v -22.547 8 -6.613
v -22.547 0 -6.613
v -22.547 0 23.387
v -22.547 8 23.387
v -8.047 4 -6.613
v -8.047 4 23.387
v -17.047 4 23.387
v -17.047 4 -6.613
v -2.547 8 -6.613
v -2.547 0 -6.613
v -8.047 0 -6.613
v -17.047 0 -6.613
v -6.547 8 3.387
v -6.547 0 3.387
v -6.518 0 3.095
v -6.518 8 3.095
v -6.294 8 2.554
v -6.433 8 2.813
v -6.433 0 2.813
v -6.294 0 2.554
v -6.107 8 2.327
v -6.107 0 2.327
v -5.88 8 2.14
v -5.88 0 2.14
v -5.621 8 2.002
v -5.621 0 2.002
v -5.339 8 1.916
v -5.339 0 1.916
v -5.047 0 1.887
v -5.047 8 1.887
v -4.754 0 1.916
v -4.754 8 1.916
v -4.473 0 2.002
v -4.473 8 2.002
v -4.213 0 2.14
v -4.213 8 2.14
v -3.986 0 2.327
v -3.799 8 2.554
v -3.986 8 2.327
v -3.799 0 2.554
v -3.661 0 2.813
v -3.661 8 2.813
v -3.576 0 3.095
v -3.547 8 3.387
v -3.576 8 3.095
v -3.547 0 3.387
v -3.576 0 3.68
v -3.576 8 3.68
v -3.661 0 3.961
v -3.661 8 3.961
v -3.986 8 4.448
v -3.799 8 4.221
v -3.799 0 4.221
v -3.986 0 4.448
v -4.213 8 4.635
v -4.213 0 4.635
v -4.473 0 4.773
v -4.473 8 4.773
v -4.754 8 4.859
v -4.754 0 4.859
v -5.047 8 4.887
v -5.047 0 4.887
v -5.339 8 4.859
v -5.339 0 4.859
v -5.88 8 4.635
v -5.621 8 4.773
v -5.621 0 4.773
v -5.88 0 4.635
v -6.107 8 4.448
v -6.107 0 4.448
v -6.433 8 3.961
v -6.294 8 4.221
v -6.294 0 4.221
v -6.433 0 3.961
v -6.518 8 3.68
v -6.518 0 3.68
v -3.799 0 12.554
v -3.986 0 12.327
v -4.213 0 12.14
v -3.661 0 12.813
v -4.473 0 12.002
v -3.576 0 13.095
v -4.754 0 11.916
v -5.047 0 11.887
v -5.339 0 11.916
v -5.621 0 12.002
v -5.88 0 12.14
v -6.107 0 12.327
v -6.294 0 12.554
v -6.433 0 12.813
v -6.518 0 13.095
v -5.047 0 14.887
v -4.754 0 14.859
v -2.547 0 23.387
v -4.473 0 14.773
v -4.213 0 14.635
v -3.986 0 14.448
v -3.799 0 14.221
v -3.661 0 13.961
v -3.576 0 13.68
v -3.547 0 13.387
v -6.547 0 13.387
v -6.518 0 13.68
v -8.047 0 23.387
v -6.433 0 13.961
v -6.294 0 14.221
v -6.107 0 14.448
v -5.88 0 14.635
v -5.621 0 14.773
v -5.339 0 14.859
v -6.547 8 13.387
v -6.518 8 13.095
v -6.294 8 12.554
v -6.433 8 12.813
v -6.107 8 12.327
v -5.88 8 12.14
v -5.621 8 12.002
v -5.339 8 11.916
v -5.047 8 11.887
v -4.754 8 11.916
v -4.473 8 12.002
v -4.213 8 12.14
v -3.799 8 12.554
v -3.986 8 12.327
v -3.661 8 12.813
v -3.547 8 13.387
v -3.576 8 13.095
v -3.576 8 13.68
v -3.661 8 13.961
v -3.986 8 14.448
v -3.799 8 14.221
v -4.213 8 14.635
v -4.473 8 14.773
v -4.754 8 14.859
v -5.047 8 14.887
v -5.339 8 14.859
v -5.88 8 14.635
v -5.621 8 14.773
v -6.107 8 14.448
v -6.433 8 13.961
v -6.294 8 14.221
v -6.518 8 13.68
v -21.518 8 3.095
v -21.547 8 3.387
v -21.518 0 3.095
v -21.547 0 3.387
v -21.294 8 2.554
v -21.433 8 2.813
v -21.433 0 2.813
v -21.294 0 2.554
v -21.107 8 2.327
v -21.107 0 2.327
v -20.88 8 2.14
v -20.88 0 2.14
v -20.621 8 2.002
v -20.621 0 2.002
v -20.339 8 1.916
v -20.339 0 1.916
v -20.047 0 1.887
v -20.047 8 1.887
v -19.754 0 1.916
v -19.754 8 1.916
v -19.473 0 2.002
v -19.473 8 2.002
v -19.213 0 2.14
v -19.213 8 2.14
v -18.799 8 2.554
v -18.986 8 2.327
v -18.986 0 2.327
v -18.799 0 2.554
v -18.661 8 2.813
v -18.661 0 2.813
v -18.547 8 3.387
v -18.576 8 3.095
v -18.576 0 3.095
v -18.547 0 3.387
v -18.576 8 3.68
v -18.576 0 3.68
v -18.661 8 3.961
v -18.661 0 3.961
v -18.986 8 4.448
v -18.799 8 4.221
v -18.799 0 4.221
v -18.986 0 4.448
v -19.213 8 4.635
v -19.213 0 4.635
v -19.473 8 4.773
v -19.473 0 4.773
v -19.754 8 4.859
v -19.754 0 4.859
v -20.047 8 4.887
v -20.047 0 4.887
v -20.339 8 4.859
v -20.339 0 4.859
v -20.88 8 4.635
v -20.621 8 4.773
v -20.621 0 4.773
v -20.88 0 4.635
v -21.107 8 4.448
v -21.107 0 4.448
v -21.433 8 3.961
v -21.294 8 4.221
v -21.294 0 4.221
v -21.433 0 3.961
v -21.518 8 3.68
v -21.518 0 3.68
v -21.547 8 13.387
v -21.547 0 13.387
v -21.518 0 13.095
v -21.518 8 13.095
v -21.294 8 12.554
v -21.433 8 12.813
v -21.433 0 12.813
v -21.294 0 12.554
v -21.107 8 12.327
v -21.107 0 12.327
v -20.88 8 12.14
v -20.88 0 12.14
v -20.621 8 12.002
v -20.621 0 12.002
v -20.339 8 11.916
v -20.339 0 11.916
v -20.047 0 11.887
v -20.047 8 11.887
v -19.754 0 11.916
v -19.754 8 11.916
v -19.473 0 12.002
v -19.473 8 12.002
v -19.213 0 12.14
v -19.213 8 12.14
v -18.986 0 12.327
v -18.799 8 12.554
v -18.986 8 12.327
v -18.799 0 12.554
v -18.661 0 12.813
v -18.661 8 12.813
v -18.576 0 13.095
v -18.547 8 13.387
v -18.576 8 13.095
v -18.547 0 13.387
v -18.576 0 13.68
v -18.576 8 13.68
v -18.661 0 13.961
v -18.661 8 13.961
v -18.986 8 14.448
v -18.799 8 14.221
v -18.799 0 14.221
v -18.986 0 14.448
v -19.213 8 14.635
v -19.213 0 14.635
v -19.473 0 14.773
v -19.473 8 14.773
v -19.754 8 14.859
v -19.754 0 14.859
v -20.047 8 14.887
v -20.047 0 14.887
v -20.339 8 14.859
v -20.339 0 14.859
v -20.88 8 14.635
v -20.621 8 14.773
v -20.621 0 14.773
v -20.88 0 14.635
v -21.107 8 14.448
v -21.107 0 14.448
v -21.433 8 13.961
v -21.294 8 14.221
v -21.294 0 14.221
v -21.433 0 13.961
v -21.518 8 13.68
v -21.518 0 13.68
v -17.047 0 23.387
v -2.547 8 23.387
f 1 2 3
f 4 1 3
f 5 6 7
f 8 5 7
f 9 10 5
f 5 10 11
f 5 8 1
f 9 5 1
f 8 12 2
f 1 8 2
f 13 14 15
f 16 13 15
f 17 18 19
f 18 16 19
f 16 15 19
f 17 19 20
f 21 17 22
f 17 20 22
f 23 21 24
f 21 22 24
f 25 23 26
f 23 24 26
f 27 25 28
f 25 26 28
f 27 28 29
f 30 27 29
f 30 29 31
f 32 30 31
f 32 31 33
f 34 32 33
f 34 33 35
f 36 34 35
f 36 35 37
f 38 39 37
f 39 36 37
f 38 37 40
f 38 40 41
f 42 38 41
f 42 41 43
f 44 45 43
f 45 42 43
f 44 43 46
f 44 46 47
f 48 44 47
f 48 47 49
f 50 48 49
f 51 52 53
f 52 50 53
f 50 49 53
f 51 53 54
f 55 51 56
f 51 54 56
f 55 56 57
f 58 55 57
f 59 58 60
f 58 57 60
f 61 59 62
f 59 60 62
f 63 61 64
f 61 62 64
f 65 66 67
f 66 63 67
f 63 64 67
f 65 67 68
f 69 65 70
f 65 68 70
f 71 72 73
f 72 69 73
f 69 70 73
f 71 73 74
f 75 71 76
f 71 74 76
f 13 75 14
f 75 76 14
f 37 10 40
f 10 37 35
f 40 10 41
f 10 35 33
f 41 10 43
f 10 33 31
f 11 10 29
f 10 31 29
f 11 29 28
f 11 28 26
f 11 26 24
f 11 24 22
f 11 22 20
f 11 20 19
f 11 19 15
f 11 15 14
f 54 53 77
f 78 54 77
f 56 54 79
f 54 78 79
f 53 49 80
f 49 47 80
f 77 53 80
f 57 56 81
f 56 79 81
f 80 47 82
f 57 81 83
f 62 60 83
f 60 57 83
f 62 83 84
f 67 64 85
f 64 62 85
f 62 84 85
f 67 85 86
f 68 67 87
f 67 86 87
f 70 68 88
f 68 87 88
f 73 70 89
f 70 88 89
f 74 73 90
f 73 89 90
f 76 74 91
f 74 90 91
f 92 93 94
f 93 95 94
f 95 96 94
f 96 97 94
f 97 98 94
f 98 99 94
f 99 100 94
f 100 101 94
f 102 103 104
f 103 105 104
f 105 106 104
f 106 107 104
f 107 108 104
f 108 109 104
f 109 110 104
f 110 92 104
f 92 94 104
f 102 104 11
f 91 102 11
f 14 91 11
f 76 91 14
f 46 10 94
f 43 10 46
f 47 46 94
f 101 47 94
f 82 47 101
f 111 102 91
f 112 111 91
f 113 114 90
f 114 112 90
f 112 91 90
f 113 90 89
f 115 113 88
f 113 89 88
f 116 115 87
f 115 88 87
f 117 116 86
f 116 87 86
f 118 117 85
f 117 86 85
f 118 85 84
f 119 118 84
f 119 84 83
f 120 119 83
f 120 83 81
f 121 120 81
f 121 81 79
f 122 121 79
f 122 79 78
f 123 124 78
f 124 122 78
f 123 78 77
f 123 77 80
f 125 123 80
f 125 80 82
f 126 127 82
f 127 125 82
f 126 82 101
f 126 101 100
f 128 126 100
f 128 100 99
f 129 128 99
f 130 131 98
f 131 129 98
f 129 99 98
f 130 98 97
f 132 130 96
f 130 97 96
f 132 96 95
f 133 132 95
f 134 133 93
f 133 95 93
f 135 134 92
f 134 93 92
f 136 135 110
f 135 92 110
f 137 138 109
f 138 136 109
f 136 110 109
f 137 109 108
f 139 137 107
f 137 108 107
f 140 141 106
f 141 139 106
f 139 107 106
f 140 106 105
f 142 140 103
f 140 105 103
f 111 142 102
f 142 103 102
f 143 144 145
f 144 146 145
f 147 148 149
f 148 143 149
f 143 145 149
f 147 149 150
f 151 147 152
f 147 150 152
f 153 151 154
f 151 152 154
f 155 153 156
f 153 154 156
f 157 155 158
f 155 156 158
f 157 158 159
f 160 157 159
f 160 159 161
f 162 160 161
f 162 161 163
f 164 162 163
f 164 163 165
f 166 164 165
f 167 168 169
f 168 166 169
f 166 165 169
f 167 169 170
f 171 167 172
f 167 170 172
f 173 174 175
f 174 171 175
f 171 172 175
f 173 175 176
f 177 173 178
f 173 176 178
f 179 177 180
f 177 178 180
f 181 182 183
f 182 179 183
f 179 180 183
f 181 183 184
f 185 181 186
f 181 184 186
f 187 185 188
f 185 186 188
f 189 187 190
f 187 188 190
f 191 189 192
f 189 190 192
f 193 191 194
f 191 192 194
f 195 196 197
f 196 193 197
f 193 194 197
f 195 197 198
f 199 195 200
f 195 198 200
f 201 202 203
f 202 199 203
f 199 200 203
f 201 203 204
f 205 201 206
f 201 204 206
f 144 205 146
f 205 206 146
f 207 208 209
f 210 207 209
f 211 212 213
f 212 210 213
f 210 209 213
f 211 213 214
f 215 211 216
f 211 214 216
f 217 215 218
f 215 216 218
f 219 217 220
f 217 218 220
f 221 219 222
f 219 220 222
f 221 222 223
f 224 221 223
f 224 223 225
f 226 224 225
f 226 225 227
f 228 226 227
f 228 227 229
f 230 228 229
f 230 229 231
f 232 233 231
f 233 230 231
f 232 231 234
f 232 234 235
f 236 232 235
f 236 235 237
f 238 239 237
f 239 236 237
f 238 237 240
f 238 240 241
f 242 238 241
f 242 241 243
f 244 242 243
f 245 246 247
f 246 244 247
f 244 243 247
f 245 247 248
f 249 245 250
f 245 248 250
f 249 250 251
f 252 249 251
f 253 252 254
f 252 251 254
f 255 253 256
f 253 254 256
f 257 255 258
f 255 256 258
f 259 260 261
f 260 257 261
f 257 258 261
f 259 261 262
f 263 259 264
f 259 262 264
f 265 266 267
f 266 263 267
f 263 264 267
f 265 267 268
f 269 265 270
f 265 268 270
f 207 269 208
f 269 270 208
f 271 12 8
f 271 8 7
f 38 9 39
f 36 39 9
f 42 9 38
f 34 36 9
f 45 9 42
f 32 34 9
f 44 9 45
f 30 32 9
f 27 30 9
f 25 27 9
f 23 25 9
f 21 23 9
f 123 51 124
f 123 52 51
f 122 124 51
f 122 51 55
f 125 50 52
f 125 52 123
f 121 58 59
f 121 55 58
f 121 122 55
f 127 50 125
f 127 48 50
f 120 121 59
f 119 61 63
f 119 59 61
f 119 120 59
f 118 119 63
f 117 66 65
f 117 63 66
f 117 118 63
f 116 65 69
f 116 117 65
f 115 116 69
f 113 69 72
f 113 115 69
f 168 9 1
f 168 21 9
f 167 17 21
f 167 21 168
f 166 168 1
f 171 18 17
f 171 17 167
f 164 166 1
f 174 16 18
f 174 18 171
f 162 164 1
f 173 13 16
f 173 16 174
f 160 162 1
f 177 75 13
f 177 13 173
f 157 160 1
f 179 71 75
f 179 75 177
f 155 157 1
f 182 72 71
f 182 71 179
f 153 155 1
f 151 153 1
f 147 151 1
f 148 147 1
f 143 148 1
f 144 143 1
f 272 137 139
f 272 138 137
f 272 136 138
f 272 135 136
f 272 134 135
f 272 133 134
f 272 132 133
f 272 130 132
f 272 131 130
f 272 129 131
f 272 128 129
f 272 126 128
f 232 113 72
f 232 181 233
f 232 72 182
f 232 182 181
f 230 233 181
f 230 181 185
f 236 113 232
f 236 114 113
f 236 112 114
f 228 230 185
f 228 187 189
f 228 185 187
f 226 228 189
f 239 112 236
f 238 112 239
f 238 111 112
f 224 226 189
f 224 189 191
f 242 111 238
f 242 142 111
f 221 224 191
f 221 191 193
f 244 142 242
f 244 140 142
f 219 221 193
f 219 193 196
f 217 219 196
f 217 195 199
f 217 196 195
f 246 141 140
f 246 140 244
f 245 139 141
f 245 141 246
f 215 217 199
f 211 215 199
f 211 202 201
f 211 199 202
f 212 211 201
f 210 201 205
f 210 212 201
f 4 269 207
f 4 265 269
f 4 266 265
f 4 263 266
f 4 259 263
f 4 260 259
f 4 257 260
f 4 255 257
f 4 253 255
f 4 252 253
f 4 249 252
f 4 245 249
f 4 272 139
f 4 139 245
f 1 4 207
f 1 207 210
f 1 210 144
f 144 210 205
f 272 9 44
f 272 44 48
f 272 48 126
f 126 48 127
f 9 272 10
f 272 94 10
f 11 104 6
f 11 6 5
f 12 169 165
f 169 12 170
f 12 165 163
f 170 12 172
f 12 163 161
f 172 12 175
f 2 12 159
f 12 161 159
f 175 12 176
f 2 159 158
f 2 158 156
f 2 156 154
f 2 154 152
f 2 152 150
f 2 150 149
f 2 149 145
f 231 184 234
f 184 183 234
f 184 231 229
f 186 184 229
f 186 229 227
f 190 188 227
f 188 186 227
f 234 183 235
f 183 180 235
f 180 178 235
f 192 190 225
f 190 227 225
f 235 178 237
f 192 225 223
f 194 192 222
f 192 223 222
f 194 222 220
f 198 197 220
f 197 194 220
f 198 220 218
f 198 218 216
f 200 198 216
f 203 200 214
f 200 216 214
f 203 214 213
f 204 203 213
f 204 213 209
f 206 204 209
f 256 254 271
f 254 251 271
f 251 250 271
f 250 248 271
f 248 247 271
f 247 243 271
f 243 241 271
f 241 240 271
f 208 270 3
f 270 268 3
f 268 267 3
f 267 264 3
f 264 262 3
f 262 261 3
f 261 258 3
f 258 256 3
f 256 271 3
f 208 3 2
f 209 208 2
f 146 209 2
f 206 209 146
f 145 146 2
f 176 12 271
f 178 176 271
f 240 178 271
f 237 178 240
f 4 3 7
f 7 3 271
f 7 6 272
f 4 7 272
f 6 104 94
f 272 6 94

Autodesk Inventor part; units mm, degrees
ref_plane "YZ Plane" through (0, 0, 0) normal (1, 0, 0) x (0, 1, 0)
ref_plane "XZ Plane" through (0, 0, 0) normal (0, 1, 0) x (-1, 0, 0)
ref_plane "XY Plane" through (0, 0, 0) normal (0, 0, 1) x (1, 0, 0)
sketch "Sketch1" plane through (0, 0, 0) normal (0, 1, 0) x (-1, 0, 0)
  line L0 (22.5467, 23.3874) -> (2.5467, 23.3874)
  line L1 (2.5467, 23.3874) -> (2.5467, -6.6126)
  line L2 (2.5467, -6.6126) -> (22.5467, -6.6126)
  line L3 (22.5467, -6.6126) -> (22.5467, 23.3874)
  line L4 (12.5467, -16.022) -> (12.5467, 29.6209)
  line L5 (17.0467, 23.3874) -> (8.0467, 23.3874)
  line L6 (8.0467, 23.3874) -> (8.0467, -6.6126)
  line L7 (8.0467, -6.6126) -> (17.0467, -6.6126)
  line L8 (17.0467, -6.6126) -> (17.0467, 23.3874)
  line L9 (26.0194, 8.3874) -> (1.0659, 8.3874)
  circle A0 centre (20.0467, 13.3874) radius 1.5
  circle A1 centre (5.0467, 13.3874) radius 1.5
  circle A2 centre (20.0467, 3.3874) radius 1.5
  circle A3 centre (5.0467, 3.3874) radius 1.5
  point P0 (0, 0)
  dimension "WR" = 9
  dimension "L" = 30
  dimension "d3" = 20
  dimension "d4" = 3
  dimension "d7" = 15
  dimension "d10" = 10
extrude "Extrusion1" add sketch "Sketch1" along normal blind 8
extrude "Extrusion2" cut sketch "Sketch1" along normal blind 4 contours L8 L9 L4 L0 | L4 L9 L6 L0 | L8 L2 L4 L9 | L4 L2 L6 L9
properties part number "slider-slider"
